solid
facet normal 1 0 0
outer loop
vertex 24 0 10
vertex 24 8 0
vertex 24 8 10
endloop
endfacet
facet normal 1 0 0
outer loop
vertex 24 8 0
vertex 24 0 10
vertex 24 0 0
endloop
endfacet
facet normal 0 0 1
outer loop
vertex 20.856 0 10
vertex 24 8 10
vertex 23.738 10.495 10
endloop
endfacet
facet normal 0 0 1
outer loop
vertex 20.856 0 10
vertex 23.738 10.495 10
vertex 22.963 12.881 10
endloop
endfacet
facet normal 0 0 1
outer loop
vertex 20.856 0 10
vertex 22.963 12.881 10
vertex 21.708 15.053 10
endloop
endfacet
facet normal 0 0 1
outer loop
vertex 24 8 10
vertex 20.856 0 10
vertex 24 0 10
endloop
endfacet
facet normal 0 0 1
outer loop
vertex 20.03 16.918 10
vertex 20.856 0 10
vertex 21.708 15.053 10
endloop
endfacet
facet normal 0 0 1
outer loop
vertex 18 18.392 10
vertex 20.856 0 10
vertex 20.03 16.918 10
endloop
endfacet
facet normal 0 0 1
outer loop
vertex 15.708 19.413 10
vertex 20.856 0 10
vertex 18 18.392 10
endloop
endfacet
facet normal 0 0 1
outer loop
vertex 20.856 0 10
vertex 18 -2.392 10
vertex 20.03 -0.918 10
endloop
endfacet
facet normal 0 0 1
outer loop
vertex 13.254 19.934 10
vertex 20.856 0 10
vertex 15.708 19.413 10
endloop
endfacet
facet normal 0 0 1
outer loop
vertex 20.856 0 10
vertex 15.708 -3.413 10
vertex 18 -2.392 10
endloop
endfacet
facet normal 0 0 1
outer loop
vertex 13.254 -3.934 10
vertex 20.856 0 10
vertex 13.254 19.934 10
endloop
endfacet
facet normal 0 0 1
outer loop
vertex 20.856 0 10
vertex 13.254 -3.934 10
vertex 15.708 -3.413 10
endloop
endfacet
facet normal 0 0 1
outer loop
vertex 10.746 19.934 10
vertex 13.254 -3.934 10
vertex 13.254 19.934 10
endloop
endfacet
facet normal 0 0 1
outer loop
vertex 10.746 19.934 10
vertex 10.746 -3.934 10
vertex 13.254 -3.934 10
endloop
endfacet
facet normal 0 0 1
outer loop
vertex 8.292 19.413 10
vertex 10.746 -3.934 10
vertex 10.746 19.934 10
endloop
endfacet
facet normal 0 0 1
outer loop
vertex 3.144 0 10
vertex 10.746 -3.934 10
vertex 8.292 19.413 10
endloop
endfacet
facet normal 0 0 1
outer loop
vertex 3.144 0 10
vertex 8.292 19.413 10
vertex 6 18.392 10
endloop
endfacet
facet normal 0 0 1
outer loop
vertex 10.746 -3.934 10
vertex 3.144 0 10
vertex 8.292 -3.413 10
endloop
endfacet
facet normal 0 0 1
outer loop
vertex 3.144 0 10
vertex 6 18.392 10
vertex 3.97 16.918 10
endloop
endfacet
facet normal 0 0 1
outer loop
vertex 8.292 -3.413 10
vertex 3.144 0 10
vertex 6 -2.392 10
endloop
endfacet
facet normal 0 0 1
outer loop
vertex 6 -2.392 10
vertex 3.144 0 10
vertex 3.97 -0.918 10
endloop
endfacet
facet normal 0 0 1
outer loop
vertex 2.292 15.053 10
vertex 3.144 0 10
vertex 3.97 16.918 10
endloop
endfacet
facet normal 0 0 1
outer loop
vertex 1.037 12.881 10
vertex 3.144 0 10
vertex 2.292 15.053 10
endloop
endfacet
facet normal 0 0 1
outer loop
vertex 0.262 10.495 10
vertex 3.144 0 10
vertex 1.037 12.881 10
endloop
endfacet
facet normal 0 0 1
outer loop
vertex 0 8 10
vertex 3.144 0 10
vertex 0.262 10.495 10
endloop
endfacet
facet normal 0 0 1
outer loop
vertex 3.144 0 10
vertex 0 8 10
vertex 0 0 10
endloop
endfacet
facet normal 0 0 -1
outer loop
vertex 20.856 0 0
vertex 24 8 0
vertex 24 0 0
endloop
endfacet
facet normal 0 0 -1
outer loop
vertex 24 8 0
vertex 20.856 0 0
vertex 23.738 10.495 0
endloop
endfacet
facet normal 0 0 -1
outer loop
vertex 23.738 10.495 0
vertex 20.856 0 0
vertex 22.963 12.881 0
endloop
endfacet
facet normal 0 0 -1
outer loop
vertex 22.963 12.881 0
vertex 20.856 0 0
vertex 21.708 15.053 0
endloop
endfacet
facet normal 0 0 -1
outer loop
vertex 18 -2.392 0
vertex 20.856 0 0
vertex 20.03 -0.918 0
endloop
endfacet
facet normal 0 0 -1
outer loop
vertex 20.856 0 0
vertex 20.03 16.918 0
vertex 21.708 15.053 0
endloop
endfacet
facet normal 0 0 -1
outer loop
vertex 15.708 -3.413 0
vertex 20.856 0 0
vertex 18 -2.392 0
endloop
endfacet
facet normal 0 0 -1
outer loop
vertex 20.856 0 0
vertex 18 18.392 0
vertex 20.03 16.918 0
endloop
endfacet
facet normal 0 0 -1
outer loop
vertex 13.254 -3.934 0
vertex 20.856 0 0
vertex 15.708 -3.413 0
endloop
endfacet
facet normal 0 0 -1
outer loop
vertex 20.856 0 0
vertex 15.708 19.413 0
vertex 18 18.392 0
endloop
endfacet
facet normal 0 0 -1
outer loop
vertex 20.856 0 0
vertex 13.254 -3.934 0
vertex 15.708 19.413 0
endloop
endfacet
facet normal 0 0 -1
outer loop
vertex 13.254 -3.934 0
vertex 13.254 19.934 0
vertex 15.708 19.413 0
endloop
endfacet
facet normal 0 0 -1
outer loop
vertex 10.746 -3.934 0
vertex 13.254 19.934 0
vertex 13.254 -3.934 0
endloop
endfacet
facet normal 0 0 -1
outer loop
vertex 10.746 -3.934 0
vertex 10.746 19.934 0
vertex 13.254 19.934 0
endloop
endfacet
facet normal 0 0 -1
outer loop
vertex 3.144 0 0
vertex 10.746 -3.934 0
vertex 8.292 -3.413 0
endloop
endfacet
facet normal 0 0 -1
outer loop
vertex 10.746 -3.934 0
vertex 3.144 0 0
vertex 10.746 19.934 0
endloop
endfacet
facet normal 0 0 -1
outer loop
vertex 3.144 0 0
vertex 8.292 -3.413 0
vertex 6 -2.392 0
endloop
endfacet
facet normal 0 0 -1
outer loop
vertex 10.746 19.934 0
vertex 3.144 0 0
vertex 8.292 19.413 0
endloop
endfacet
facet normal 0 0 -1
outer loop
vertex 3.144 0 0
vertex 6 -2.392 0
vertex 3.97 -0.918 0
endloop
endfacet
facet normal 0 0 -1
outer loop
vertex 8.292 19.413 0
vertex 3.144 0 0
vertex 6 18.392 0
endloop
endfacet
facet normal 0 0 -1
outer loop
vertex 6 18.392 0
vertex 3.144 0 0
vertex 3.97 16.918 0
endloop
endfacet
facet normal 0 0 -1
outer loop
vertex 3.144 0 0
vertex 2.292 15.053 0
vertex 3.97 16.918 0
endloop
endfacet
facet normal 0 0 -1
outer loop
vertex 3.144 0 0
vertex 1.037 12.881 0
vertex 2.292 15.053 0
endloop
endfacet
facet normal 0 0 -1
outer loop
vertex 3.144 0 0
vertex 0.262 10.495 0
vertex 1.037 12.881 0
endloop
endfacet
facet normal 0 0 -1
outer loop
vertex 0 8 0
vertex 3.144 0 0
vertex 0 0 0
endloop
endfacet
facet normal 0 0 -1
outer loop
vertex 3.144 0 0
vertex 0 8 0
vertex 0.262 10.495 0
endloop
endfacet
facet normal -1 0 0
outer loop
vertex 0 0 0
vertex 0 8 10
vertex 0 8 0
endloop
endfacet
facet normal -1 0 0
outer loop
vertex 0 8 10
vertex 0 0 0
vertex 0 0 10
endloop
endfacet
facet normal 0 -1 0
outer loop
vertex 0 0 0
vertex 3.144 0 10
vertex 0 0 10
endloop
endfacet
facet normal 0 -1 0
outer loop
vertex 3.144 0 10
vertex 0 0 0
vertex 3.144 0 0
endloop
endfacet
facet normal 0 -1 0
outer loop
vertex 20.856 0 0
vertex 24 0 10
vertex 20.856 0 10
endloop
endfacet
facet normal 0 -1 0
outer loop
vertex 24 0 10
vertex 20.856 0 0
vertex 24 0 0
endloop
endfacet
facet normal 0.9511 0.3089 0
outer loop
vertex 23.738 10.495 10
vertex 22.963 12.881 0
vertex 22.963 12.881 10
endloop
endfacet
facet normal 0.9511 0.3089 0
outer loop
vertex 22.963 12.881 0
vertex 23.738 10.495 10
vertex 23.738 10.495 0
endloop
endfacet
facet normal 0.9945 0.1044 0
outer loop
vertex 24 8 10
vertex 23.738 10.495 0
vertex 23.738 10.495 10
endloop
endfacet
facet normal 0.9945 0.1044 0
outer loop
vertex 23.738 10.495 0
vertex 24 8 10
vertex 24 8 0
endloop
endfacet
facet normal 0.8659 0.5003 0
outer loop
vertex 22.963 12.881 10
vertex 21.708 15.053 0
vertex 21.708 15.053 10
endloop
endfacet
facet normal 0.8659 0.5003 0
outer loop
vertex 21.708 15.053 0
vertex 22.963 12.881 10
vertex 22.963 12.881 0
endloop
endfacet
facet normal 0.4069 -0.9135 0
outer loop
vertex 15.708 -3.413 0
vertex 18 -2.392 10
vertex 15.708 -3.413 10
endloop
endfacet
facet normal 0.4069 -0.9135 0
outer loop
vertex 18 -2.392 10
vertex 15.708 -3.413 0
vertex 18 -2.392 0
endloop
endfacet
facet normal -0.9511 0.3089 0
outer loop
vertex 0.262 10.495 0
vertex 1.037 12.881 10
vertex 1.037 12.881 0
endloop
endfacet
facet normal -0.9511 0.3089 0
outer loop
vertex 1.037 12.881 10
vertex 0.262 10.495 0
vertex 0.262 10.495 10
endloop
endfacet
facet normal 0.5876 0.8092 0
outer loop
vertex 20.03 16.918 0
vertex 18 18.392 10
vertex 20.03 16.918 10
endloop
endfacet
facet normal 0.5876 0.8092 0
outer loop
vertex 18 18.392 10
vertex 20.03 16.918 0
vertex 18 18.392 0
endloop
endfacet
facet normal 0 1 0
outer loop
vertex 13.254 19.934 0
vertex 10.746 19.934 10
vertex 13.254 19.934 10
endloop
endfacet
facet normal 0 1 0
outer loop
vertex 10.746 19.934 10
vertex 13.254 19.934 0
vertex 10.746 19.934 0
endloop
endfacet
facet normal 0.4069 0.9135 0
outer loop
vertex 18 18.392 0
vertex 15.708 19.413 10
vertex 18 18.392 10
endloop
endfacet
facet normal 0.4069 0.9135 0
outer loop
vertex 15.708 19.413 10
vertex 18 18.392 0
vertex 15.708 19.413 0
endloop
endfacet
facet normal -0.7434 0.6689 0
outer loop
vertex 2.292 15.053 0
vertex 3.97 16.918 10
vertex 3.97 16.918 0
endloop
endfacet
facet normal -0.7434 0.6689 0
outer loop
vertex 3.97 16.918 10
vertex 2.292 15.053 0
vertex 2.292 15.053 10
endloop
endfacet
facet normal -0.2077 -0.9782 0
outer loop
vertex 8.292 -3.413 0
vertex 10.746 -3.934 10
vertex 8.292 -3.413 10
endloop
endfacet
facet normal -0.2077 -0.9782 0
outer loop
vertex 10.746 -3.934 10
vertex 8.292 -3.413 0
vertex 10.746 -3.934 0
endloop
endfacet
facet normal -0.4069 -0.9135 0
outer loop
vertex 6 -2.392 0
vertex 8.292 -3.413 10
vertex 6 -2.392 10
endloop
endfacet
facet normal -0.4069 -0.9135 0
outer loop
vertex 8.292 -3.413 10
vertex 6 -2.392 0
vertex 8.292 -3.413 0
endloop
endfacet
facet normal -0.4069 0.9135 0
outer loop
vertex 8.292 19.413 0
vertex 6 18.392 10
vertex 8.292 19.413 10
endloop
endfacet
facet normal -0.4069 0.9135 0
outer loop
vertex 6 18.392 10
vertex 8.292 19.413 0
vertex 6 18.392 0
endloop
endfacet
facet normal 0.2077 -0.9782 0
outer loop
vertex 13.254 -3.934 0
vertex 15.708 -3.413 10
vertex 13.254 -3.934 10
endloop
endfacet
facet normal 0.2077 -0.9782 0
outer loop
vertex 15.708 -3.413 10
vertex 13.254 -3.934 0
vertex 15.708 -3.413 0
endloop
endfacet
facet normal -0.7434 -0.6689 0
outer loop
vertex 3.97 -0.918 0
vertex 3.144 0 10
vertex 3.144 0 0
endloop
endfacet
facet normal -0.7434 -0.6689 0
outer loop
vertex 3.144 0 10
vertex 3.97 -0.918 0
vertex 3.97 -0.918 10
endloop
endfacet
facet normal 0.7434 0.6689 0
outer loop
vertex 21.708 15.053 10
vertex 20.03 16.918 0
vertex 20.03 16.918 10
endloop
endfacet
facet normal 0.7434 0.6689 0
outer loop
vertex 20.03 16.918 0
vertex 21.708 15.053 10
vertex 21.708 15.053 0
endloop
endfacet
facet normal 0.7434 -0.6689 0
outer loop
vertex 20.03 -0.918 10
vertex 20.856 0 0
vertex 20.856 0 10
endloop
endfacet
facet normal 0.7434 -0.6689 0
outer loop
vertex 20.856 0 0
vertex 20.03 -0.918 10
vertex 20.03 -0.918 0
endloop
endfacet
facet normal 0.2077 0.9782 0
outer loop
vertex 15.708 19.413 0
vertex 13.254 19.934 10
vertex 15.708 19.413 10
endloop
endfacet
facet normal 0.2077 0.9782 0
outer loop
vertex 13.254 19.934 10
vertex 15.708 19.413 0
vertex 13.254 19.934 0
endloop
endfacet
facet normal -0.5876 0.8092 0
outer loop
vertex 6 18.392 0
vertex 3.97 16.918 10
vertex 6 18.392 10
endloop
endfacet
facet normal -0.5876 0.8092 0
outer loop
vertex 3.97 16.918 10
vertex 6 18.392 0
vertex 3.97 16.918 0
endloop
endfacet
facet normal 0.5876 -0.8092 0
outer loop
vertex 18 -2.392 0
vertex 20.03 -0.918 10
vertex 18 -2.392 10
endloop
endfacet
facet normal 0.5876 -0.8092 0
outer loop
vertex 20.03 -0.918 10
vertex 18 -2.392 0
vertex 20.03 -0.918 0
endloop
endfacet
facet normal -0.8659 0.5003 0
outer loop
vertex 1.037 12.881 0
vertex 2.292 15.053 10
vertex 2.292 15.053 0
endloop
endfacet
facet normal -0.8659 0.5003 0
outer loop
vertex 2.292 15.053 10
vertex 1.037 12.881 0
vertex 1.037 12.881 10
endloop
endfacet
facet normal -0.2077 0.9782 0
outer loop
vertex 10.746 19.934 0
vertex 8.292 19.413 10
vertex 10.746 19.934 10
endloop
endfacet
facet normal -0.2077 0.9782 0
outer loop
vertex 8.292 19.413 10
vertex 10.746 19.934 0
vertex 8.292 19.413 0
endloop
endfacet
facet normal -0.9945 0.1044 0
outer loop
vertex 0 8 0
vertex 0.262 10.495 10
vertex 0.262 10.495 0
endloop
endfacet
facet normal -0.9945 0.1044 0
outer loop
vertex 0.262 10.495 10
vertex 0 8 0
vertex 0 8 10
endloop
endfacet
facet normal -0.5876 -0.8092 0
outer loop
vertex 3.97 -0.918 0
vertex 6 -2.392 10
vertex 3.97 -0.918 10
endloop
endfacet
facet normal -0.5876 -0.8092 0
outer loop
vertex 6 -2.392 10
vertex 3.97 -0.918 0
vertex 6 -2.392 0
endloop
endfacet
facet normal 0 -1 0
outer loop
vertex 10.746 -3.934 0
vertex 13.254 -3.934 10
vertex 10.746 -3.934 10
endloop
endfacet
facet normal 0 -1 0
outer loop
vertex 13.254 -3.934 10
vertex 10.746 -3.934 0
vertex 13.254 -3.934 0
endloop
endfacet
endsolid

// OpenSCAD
R = 8;
H = 10;

union()
{
    cube([24,8,H]);
    translate([12,R,0])cylinder(r=12,h=H);
}
